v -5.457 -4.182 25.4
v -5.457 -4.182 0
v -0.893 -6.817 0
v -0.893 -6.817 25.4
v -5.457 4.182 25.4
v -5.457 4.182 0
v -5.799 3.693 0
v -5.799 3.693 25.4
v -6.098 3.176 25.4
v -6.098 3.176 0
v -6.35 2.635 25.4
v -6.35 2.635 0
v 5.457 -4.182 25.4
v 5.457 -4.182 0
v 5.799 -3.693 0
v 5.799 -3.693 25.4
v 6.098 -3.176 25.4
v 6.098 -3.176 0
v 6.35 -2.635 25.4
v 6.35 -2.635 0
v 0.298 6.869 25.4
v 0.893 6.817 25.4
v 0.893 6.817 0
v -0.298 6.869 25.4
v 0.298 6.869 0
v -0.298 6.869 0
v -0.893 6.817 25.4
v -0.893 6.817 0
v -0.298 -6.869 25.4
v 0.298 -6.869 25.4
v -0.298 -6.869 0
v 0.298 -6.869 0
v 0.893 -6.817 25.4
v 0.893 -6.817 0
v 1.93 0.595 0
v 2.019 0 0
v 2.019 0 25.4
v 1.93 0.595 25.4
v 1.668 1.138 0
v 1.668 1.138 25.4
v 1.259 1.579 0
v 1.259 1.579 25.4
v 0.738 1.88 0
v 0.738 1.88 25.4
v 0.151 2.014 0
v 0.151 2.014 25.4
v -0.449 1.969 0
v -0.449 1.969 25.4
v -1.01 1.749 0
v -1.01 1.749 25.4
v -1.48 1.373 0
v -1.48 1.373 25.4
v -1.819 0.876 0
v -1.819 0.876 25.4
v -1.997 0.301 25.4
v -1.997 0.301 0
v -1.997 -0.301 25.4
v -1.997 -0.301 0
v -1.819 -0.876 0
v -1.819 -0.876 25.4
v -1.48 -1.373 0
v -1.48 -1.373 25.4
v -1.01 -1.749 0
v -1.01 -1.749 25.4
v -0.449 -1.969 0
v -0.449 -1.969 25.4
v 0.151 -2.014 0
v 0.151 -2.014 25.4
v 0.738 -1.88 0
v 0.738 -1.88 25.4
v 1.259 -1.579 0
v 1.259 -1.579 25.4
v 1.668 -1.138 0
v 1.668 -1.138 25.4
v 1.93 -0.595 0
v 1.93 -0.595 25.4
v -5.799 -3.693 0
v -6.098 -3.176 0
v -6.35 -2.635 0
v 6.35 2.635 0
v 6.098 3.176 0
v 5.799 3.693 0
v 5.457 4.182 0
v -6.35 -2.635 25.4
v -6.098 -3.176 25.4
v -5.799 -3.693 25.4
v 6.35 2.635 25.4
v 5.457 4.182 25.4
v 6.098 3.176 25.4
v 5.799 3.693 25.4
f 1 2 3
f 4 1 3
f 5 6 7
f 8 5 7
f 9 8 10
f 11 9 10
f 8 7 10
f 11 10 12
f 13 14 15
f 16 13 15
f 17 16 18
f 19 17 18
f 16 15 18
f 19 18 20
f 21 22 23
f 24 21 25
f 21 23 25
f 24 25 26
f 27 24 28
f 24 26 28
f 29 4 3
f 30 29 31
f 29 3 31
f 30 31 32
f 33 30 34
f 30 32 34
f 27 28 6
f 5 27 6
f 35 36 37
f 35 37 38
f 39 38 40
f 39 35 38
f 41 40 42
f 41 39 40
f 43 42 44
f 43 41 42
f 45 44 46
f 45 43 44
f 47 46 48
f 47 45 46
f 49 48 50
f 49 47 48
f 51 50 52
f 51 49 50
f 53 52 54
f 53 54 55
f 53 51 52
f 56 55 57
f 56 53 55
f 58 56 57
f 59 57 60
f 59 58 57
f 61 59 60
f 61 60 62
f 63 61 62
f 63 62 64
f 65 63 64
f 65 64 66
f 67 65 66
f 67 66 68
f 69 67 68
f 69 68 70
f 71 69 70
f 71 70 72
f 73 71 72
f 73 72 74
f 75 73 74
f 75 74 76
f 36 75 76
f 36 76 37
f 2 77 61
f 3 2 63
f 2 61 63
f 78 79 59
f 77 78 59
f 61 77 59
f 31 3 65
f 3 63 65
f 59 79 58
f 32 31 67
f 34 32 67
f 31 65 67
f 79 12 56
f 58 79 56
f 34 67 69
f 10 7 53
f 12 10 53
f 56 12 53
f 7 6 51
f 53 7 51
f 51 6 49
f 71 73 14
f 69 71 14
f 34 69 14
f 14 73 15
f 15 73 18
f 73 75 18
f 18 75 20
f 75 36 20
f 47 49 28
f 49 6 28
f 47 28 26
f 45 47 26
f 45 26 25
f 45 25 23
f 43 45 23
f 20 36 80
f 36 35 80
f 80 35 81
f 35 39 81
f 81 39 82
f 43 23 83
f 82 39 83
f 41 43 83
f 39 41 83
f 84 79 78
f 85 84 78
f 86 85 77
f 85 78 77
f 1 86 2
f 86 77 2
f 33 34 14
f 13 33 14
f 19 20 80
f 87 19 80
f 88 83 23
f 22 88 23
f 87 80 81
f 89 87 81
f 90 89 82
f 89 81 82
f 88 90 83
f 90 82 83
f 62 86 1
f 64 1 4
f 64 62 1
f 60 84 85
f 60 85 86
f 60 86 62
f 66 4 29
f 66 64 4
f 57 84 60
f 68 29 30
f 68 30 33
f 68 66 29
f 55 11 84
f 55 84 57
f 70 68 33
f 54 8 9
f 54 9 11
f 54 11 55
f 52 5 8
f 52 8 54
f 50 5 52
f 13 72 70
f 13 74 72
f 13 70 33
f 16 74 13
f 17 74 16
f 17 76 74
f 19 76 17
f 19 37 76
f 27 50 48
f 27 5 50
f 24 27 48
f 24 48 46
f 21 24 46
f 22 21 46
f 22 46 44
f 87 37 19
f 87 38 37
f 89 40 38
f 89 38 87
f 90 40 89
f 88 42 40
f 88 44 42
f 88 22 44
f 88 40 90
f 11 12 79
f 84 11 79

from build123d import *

# Parameters (mm, degrees)
SKETCH1_R                            = 2.0193
BOSS_EXTRUDE1_DEPTH                  = 25.4
F_10_32_TAPPED_HOLE1_D               = 4.0386
F_10_32_TAPPED_HOLE1_DEPTH           = 12.02944
F_10_32_TAPPED_HOLE1_TIP             = 1.213317848
F_10_32_TAPPED_HOLE1_ON_FACE_2_D     = 4.0386
F_10_32_TAPPED_HOLE1_ON_FACE_2_DEPTH = 12.02944
F_10_32_TAPPED_HOLE1_ON_FACE_2_TIP   = 1.213317848


with BuildPart() as part:
    # Sketch1 → Boss-Extrude1 (new body)
    with BuildSketch(Plane.XY):
        with BuildLine():
            ThreePointArc((0.893039571, 6.816751782), (0, 6.874999966), (-0.893039571, 6.816751782))
            Line((-0.893039571, 6.816751782), (-5.456960429, 4.181770846))
            ThreePointArc((-5.456960429, 4.181770846), (-5.953924622, 3.437499983), (-6.35, 2.634980936))
            Line((-6.35, 2.634980936), (-6.35, -2.634980936))
            ThreePointArc((-6.35, -2.634980936), (-5.953924622, -3.437499983), (-5.456960429, -4.181770846))
            Line((-5.456960429, -4.181770846), (-0.893039571, -6.816751782))
            ThreePointArc((-0.893039571, -6.816751782), (0, -6.874999966), (0.893039571, -6.816751782))
            Line((0.893039571, -6.816751782), (5.456960429, -4.181770846))
            ThreePointArc((5.456960429, -4.181770846), (5.953924622, -3.437499983), (6.35, -2.634980936))
            Line((6.35, -2.634980936), (6.35, 2.634980936))
            ThreePointArc((6.35, 2.634980936), (5.953924622, 3.437499983), (5.456960429, 4.181770846))
            Line((5.456960429, 4.181770846), (0.893039571, 6.816751782))
        make_face()
        Circle(SKETCH1_R, mode=Mode.SUBTRACT)
    extrude(amount=BOSS_EXTRUDE1_DEPTH)

    # #10-32 Tapped Hole1
    with Locations(Plane.XY.offset(25.4)):
        with Locations((0, 0)):
            Hole(F_10_32_TAPPED_HOLE1_D / 2, depth=F_10_32_TAPPED_HOLE1_DEPTH)
            with Locations((0, 0, -(F_10_32_TAPPED_HOLE1_DEPTH + F_10_32_TAPPED_HOLE1_TIP / 2))):  # 118° drill point
                Cone(0, F_10_32_TAPPED_HOLE1_D / 2, F_10_32_TAPPED_HOLE1_TIP, mode=Mode.SUBTRACT)

    # #10-32 Tapped Hole1 on face 2
    with Locations(Plane.XY):
        with Locations((0, 0)):
            Hole(F_10_32_TAPPED_HOLE1_ON_FACE_2_D / 2, depth=F_10_32_TAPPED_HOLE1_ON_FACE_2_DEPTH)
            with Locations((0, 0, -(F_10_32_TAPPED_HOLE1_ON_FACE_2_DEPTH + F_10_32_TAPPED_HOLE1_ON_FACE_2_TIP / 2))):  # 118° drill point
                Cone(0, F_10_32_TAPPED_HOLE1_ON_FACE_2_D / 2, F_10_32_TAPPED_HOLE1_ON_FACE_2_TIP, mode=Mode.SUBTRACT)


solid = part.part
